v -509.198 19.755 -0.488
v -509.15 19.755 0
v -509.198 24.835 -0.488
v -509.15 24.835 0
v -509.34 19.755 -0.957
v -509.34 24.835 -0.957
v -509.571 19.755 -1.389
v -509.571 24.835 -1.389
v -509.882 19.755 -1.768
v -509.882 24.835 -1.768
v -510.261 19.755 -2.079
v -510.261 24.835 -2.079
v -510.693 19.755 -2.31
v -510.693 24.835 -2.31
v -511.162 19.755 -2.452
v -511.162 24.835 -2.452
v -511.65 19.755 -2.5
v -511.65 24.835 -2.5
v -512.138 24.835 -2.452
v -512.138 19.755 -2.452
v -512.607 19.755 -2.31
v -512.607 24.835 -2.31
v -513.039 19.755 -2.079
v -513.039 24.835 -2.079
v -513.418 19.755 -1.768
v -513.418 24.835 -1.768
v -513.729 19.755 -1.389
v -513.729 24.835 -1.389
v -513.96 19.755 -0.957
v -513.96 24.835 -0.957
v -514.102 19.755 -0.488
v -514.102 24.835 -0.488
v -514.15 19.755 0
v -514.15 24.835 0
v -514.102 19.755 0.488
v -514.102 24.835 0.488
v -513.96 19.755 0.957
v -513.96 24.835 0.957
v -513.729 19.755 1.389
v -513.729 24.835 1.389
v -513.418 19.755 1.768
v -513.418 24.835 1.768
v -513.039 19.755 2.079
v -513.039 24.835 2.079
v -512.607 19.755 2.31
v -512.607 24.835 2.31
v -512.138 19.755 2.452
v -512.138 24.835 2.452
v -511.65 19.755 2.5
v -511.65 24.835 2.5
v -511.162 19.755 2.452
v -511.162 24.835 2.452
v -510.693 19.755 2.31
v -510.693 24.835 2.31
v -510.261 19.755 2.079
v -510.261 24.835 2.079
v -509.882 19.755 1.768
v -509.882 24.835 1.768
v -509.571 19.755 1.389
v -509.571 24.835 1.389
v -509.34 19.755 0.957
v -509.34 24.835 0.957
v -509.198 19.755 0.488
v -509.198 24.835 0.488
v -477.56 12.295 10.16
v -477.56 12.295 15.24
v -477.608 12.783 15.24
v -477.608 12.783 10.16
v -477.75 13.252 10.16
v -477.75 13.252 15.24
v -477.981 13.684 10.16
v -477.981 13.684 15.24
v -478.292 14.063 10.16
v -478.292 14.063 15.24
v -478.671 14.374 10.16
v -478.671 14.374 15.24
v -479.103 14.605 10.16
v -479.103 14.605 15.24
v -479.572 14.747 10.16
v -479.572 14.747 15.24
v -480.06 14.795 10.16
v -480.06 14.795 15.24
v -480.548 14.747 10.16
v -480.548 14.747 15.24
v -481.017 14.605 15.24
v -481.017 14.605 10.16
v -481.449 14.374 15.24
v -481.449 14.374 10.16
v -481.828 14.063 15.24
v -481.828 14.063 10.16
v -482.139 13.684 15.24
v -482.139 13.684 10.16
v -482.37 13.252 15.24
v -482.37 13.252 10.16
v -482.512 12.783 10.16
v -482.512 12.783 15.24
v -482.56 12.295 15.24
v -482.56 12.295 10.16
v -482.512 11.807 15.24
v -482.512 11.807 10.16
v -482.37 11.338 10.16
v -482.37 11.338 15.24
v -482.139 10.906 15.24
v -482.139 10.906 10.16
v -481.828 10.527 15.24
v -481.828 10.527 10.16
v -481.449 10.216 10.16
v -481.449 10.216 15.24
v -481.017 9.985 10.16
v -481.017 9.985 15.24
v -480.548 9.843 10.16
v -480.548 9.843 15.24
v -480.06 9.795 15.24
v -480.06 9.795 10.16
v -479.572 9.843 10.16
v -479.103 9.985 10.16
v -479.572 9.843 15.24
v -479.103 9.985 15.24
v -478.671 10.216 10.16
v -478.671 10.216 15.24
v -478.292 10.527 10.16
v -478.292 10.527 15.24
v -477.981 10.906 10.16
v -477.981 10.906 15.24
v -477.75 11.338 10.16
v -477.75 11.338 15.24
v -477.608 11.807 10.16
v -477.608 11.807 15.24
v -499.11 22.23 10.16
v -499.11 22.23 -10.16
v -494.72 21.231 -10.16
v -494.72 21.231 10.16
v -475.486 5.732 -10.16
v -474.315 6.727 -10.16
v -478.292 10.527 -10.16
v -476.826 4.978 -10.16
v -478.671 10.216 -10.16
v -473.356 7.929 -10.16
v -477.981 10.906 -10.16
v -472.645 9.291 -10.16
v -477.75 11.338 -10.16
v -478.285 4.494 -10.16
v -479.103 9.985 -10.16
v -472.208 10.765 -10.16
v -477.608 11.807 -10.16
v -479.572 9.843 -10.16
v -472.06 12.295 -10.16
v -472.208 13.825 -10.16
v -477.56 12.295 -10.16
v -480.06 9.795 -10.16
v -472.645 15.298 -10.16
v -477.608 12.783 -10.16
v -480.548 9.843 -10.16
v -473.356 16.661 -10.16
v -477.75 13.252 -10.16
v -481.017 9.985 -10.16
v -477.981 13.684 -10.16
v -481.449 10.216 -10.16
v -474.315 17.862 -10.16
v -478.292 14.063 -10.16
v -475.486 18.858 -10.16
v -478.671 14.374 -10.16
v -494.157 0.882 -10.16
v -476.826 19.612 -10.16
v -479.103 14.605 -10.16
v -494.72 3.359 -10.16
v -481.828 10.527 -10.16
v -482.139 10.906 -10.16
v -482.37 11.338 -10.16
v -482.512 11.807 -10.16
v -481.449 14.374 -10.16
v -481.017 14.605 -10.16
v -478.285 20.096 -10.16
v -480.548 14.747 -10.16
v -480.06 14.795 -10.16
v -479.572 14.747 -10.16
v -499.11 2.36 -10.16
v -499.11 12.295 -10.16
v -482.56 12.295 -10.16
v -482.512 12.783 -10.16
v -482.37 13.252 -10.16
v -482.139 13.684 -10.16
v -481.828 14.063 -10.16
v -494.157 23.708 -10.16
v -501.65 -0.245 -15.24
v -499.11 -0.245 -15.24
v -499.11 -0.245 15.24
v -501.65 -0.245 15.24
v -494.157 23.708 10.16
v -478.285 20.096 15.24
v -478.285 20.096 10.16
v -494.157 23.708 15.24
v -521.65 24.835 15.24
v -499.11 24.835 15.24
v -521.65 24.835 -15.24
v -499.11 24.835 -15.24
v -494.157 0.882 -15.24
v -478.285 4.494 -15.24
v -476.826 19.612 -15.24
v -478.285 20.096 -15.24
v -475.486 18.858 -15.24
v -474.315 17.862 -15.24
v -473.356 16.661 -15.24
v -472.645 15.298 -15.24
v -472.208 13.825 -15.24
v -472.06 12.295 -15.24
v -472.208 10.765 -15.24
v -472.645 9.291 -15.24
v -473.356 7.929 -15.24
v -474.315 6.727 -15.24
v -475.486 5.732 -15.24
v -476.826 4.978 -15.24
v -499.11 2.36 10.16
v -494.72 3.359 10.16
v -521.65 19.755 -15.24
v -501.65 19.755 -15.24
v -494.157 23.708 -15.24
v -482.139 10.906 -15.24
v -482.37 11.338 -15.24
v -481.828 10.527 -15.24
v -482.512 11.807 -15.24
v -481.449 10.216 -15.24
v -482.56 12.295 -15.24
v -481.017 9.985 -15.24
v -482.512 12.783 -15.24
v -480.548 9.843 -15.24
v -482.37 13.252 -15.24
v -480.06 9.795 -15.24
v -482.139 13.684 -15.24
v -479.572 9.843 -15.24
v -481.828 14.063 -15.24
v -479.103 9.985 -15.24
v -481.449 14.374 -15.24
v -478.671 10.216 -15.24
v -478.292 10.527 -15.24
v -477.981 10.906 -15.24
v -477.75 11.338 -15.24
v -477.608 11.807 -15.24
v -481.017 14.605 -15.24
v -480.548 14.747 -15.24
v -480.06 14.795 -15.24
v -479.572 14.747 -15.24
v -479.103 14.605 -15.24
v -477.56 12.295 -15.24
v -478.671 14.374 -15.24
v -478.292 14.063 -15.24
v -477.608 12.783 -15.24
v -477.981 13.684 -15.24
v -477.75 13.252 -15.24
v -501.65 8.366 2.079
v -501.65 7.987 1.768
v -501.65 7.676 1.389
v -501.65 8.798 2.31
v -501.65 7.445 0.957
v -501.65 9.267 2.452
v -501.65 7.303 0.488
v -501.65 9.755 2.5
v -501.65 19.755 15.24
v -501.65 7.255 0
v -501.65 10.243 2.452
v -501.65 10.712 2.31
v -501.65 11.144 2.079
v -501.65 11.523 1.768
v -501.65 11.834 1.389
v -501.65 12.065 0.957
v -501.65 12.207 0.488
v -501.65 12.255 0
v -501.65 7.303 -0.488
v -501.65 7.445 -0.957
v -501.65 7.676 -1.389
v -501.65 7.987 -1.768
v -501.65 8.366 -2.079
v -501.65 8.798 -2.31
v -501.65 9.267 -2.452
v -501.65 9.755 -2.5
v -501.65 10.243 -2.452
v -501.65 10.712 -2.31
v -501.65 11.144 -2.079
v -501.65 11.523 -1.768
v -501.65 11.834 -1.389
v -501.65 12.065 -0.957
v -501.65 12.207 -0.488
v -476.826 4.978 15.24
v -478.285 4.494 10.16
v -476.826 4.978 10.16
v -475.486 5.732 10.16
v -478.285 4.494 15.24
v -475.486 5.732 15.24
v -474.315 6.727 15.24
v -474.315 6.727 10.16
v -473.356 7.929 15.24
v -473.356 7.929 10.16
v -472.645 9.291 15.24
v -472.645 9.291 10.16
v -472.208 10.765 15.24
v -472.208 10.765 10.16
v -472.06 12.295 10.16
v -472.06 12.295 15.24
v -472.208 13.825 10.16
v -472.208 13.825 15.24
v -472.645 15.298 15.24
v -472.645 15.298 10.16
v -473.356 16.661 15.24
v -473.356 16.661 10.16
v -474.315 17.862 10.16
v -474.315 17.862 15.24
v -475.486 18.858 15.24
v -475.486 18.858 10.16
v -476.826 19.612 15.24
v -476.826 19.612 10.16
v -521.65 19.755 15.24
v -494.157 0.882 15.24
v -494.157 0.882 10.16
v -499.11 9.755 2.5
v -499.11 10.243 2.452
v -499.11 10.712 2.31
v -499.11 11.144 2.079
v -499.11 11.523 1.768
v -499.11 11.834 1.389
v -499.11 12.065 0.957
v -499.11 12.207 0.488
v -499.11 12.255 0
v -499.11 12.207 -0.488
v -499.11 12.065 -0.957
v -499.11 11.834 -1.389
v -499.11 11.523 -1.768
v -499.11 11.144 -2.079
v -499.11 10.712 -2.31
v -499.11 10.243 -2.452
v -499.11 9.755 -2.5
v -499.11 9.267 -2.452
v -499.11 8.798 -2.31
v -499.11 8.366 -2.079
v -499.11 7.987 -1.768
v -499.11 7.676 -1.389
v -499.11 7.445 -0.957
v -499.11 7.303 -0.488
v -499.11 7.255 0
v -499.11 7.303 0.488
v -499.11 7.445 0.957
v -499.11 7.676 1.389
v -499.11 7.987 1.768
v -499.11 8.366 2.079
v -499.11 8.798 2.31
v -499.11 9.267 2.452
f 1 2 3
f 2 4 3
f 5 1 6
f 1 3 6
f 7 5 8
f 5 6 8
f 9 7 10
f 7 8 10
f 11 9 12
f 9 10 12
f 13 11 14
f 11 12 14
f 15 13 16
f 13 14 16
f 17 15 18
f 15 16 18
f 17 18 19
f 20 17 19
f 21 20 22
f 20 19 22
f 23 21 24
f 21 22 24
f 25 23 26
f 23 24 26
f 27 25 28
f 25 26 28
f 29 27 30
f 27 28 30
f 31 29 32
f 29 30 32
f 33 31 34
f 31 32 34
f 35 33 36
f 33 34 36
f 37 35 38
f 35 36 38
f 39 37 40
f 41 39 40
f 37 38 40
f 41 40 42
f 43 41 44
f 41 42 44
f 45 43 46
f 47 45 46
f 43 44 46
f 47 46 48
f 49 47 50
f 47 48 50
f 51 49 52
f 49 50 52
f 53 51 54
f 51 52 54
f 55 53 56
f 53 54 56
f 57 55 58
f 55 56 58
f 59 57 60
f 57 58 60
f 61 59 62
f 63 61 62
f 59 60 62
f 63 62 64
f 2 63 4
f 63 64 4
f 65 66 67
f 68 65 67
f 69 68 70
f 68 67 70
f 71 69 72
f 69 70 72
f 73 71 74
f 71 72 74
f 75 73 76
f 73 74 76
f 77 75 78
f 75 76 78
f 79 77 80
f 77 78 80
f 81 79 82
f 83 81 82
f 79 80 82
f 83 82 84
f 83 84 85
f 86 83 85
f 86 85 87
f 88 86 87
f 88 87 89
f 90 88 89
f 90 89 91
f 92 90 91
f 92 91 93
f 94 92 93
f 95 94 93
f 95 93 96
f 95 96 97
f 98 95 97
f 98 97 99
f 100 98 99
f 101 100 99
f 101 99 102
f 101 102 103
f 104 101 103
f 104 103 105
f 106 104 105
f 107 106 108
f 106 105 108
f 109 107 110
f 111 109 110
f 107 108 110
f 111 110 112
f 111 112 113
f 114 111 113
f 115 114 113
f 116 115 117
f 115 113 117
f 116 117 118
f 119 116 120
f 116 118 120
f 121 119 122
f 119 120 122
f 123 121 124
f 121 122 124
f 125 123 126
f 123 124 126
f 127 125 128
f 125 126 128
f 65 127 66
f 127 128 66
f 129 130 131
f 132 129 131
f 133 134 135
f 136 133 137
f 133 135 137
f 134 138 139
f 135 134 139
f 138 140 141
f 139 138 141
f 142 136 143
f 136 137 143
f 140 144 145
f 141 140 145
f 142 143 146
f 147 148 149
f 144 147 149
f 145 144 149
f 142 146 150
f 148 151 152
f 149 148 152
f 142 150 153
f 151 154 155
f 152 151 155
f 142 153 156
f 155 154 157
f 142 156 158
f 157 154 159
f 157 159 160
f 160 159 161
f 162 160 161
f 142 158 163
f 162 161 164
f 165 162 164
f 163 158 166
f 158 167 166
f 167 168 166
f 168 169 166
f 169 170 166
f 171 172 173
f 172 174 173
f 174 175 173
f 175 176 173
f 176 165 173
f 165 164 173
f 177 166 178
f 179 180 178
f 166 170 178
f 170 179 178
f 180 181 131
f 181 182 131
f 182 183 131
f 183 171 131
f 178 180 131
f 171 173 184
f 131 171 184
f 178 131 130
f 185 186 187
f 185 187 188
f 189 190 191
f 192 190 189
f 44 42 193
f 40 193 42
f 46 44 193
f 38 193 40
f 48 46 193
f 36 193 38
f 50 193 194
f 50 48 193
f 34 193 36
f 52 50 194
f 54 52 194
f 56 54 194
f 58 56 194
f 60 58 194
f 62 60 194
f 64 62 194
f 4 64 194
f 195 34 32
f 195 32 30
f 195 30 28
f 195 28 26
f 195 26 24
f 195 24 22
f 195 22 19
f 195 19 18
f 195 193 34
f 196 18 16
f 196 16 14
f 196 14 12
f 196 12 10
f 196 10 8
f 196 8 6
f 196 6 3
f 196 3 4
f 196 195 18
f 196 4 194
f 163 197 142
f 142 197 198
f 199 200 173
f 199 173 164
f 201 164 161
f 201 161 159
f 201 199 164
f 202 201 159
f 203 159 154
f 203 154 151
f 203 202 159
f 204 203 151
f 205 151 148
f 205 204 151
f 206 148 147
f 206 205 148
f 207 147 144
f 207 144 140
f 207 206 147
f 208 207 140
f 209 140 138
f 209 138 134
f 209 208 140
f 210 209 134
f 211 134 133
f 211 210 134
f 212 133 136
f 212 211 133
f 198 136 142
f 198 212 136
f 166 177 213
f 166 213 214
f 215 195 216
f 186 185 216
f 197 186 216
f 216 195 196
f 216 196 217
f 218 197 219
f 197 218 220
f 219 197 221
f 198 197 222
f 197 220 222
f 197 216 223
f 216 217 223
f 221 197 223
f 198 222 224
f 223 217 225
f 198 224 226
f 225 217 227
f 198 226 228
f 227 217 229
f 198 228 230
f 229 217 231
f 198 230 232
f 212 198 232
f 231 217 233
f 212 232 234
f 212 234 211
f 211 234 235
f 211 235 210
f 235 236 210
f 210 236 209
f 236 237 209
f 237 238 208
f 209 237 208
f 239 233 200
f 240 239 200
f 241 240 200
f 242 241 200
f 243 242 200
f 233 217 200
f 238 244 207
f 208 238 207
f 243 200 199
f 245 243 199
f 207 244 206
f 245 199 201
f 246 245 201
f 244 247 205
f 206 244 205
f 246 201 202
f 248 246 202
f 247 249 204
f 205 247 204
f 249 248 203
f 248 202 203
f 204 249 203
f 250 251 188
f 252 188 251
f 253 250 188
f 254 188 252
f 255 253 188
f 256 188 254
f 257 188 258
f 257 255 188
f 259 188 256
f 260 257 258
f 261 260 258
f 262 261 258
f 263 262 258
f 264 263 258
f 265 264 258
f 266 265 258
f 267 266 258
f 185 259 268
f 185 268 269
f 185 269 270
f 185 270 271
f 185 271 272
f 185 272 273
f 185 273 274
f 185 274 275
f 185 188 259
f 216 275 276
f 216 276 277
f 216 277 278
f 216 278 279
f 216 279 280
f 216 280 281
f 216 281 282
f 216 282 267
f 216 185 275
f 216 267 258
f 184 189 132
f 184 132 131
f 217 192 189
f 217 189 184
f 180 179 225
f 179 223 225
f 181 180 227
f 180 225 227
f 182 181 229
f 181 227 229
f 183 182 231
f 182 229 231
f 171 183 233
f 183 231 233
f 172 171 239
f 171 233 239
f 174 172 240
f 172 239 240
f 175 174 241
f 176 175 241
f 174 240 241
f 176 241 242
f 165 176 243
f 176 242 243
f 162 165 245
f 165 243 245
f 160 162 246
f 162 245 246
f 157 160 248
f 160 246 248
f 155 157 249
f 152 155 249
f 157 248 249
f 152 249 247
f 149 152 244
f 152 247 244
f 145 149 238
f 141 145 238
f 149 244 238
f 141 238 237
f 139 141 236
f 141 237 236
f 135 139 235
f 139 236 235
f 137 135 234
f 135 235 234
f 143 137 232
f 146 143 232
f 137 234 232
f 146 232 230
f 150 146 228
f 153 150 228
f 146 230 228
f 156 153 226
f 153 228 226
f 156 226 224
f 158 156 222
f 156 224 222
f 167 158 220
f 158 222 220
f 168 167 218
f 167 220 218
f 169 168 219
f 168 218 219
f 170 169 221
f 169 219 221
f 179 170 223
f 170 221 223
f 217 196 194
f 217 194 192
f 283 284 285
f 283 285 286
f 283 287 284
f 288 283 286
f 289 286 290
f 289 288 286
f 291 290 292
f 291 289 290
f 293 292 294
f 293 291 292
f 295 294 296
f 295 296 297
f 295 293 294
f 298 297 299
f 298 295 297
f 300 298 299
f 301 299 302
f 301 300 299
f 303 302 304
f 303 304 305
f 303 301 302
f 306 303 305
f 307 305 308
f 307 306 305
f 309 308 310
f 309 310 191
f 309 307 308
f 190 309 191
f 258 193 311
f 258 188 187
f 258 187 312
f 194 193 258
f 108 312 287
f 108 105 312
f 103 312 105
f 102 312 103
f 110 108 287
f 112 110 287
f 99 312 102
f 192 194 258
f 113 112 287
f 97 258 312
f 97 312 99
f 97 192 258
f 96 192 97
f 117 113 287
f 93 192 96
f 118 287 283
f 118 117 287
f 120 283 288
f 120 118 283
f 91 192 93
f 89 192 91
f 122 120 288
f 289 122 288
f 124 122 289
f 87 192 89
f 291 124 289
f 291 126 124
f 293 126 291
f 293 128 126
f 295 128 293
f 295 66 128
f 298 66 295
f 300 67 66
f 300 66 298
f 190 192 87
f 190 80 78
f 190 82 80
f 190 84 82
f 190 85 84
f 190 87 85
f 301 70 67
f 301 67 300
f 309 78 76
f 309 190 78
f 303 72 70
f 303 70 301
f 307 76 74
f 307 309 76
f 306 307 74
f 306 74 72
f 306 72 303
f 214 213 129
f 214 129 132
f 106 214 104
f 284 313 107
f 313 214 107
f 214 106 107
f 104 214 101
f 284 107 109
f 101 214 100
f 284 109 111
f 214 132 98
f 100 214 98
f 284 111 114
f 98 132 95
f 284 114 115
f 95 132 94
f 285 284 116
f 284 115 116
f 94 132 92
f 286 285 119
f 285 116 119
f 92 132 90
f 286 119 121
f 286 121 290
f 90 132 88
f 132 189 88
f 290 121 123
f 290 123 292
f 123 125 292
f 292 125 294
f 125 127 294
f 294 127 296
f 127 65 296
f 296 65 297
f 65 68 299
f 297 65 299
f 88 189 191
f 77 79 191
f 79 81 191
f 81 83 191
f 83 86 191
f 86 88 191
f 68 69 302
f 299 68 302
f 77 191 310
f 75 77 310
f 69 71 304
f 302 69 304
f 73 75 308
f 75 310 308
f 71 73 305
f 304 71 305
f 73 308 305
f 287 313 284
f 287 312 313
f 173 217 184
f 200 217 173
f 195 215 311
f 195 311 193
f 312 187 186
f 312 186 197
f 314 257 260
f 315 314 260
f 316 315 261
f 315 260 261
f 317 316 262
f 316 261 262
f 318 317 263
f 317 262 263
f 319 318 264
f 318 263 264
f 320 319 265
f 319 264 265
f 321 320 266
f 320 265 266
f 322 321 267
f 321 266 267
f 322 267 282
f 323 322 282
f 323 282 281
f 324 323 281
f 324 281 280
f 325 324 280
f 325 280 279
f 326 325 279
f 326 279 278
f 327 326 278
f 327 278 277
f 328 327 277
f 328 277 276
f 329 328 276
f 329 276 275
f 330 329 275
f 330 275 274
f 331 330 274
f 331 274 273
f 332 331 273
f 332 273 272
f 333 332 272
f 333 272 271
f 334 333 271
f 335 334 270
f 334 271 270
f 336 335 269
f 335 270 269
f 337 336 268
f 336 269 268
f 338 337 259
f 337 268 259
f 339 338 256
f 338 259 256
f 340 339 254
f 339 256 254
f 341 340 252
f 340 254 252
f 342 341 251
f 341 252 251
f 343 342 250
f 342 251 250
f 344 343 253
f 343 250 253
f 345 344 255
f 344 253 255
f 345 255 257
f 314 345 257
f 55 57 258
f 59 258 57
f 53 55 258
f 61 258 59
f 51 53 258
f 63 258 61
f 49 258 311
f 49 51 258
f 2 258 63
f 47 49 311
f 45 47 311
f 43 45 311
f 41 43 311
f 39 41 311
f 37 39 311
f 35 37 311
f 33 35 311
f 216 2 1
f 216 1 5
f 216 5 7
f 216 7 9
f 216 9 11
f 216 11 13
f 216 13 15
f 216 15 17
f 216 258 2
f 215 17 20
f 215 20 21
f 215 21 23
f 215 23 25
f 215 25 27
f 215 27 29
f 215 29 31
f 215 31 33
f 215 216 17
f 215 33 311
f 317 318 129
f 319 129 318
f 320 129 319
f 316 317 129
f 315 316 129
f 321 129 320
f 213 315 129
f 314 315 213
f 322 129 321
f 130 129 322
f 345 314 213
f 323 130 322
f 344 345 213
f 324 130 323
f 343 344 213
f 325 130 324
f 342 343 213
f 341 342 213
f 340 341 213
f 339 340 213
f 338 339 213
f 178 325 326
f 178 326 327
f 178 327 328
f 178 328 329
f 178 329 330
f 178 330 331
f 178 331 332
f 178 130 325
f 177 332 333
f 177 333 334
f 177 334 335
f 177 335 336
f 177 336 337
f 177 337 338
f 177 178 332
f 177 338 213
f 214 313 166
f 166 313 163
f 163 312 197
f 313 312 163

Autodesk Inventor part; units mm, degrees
ref_plane "YZ Plane" through (0, 0, 0) normal (1, 0, 0) x (0, 1, 0)
ref_plane "XZ Plane" through (0, 0, 0) normal (0, 1, 0) x (-1, 0, 0)
ref_plane "XY Plane" through (0, 0, 0) normal (0, 0, 1) x (1, 0, 0)
ref_plane "Work Plane1" through (0, 0, 0) normal (0, 0, 1) x (1, 0, 0)
sketch "Sketch1" plane through (0, 0, 0) normal (0, 0, 1) x (1, 0, 0)
  line L0 (-521.65, -0.245) -> (-521.65, -0.245) projected
  line L1 (-521.65, 19.755) -> (-521.65, -0.245) projected
  line L2 (-521.65, 19.755) -> (-521.65, 19.755) projected
  line L3 (-521.65, -0.245) -> (-521.65, 19.755) projected
  line L4 (-501.65, 19.755) -> (-501.65, 19.755) projected
  line L5 (-501.65, -0.245) -> (-501.65, 19.755) projected
  line L6 (-501.65, -0.245) -> (-501.65, -0.245) projected
  line L7 (-501.65, 19.755) -> (-501.65, -0.245) projected
  line L8 (-521.65, -0.245) -> (-521.65, -0.245) projected
  line L9 (-521.65, 19.755) -> (-521.65, -0.245) projected
  line L10 (-521.65, 19.755) -> (-521.65, 19.755) projected
  line L11 (-521.65, -0.245) -> (-521.65, 19.755) projected
  line L12 (-501.65, 19.755) -> (-499.11, 19.755)
  line L13 (-499.11, 19.755) -> (-499.11, -0.245)
  line L14 (-499.11, -0.245) -> (-501.65, -0.245)
  line L15 (-501.65, -0.245) -> (-501.65, 19.755)
  line L16 (-499.11, 19.755) -> (-521.65, 19.755)
  line L17 (-521.65, 19.755) -> (-521.65, 24.835)
  line L18 (-521.65, 24.835) -> (-499.11, 24.835)
  line L19 (-499.11, 24.835) -> (-499.11, 19.755)
  point P0 (0, 0)
  dimension "d0" = 2.54
  dimension "d1" = 5.08
extrude "Extrusion1" add sketch "Sketch1" along normal mid plane 30.48
sketch "Sketch2" plane through (-521.65, 24.835, 15.24) normal (0, 1, 0) x (1, 0, 0)
  line L0 (0, 30.48) -> (0, 0) projected
  line L1 (22.54, 0) -> (0, 0) projected
  line L2 (22.54, 30.48) -> (22.54, 0) projected
  line L3 (0, 30.48) -> (22.54, 30.48) projected
  line L4 (20, 345.44) -> (20, -314.96) projected
  line L5 (0, 30.48) -> (0, 0) projected
  line L6 (0, 15.24) -> (20, 15.24)
  circle A0 centre (10, 15.24) radius 2.5
  point P0 (521.65, 15.24)
  dimension "d4" = 5
extrude "Extrusion2" cut sketch "Sketch2" against normal blind 25.4 contours A0 L6 | L6 A0
sketch "Sketch3" plane through (-501.65, -0.245, 15.24) normal (-1, 0, 0) x (0, 0, 1)
  line L0 (-345.44, 0) -> (314.96, 0) projected
  line L1 (-30.48, 20) -> (0, 20) projected
  line L2 (-15.24, 20) -> (-15.24, 0)
  line L3 (-30.48, 0) -> (0, 0) projected
  circle A0 centre (-15.24, 10) radius 2.5
  point P0 (-15.24, 0.245)
  dimension "d7" = 5
extrude "Extrusion3" cut sketch "Sketch3" against normal blind 25.4
sketch "Sketch4" plane through (0, 0, -15.24) normal (0, 0, -1) x (-1, 0, 0)
  line L0 (499.11, -0.245) -> (499.11, 24.835) projected
  line L1 (499.11, 24.835) -> (499.11, -0.245) projected
  line L2 (499.11, 12.295) -> (480.06, 12.295)
  line L3 (499.11, 12.295) -> (518.16, 12.295) construction
  arc A0 (478.2847, 20.0955) -> (478.2847, 4.4944) centre (480.06, 12.295) ccw
  circle A1 centre (480.06, 12.295) radius 2.5
  line L4 (499.11, 24.835) -> (478.2847, 20.0955)
  line L5 (499.11, -0.245) -> (478.2847, 4.4944)
  point P0 (0, 0)
  dimension "d10" = 19.05
  dimension "d11" = 180
  dimension "d12" = 16
  dimension "d13" = 5
extrude "Extrusion4" add sketch "Sketch4" against normal blind 5.08
sketch "Sketch5" plane through (0, 0, 15.24) normal (0, 0, 1) x (1, 0, 0)
  circle A0 centre (-480.06, 12.295) radius 2.5 projected
  line L0 (-499.11, -0.245) -> (-499.11, 24.835) projected
  line L1 (-499.11, -0.245) -> (-478.2847, 4.4944) projected
  arc A1 (-478.2847, 4.4944) -> (-478.2847, 20.0955) centre (-480.06, 12.295) ccw projected
  line L2 (-478.2847, 20.0955) -> (-499.11, 24.835) projected
  point P0 (0, 0)
extrude "Extrusion5" add sketch "Sketch5" against normal blind 5.08
sketch "Sketch6" plane through (-499.11, -0.245, 10.16) normal (0.2219, -0.9751, 0) x (0.9751, 0.2219, 0)
  line L0 (0, 5.08) -> (21.3578, 5.08) projected
  line L1 (0, 0) -> (0, 5.08) projected
  line L2 (21.3578, 0) -> (0, 0) projected
  line L3 (21.3578, 5.08) -> (21.3578, 0) projected
  line L4 (21.3578, -25.4) -> (0, -25.4) projected
  line L5 (21.3578, -25.4) -> (21.3578, -20.32) projected
  line L6 (0, -20.32) -> (21.3578, -20.32) projected
  line L7 (0, -25.4) -> (0, -20.32) projected
  line L8 (0, -20.32) -> (0, 0) projected
  line L9 (21.3578, -25.4) -> (0, -25.4) projected
  line L10 (0, 5.08) -> (5.08, 5.08)
  line L11 (5.08, 5.08) -> (5.08, -25.4)
  line L12 (5.08, -25.4) -> (0, -25.4)
  line L13 (0, -25.4) -> (0, 5.08)
  point P0 (486.7204, -10.16)
  dimension "d18" = 5.08
extrude "Extrusion6" add sketch "Sketch6" against normal blind 2.54 contours L0 L11 L2 L1 | L2 L11 L6 L8 | L6 L11 L4 L7
sketch "Sketch7" plane through (-499.11, 24.835, -10.16) normal (0.2219, 0.9751, 0) x (0.9751, -0.2219, 0)
  line L0 (21.3578, -25.4) -> (0, -25.4) projected
  line L1 (21.3578, -25.4) -> (21.3578, -20.32) projected
  line L2 (0, -20.32) -> (21.3578, -20.32) projected
  line L3 (0, -20.32) -> (0, -25.4) projected
  line L4 (0, 5.08) -> (21.3578, 5.08) projected
  line L5 (0, 5.08) -> (0, 0) projected
  line L6 (21.3578, 0) -> (0, 0) projected
  line L7 (21.3578, 5.08) -> (21.3578, 0) projected
  line L8 (0, -25.4) -> (5.08, -25.4)
  line L9 (5.08, -25.4) -> (5.08, 5.08)
  line L10 (5.08, 5.08) -> (0, 5.08)
  line L11 (0, 5.08) -> (0, -25.4)
  point P0 (492.1771, -10.16)
  dimension "d21" = 5.08
extrude "Extrusion7" add sketch "Sketch7" against normal blind 2.54 contours L0 L3 L2 L9 | L2 L11 L6 L9 | L6 L5 L4 L9
properties part number "YIdler"
